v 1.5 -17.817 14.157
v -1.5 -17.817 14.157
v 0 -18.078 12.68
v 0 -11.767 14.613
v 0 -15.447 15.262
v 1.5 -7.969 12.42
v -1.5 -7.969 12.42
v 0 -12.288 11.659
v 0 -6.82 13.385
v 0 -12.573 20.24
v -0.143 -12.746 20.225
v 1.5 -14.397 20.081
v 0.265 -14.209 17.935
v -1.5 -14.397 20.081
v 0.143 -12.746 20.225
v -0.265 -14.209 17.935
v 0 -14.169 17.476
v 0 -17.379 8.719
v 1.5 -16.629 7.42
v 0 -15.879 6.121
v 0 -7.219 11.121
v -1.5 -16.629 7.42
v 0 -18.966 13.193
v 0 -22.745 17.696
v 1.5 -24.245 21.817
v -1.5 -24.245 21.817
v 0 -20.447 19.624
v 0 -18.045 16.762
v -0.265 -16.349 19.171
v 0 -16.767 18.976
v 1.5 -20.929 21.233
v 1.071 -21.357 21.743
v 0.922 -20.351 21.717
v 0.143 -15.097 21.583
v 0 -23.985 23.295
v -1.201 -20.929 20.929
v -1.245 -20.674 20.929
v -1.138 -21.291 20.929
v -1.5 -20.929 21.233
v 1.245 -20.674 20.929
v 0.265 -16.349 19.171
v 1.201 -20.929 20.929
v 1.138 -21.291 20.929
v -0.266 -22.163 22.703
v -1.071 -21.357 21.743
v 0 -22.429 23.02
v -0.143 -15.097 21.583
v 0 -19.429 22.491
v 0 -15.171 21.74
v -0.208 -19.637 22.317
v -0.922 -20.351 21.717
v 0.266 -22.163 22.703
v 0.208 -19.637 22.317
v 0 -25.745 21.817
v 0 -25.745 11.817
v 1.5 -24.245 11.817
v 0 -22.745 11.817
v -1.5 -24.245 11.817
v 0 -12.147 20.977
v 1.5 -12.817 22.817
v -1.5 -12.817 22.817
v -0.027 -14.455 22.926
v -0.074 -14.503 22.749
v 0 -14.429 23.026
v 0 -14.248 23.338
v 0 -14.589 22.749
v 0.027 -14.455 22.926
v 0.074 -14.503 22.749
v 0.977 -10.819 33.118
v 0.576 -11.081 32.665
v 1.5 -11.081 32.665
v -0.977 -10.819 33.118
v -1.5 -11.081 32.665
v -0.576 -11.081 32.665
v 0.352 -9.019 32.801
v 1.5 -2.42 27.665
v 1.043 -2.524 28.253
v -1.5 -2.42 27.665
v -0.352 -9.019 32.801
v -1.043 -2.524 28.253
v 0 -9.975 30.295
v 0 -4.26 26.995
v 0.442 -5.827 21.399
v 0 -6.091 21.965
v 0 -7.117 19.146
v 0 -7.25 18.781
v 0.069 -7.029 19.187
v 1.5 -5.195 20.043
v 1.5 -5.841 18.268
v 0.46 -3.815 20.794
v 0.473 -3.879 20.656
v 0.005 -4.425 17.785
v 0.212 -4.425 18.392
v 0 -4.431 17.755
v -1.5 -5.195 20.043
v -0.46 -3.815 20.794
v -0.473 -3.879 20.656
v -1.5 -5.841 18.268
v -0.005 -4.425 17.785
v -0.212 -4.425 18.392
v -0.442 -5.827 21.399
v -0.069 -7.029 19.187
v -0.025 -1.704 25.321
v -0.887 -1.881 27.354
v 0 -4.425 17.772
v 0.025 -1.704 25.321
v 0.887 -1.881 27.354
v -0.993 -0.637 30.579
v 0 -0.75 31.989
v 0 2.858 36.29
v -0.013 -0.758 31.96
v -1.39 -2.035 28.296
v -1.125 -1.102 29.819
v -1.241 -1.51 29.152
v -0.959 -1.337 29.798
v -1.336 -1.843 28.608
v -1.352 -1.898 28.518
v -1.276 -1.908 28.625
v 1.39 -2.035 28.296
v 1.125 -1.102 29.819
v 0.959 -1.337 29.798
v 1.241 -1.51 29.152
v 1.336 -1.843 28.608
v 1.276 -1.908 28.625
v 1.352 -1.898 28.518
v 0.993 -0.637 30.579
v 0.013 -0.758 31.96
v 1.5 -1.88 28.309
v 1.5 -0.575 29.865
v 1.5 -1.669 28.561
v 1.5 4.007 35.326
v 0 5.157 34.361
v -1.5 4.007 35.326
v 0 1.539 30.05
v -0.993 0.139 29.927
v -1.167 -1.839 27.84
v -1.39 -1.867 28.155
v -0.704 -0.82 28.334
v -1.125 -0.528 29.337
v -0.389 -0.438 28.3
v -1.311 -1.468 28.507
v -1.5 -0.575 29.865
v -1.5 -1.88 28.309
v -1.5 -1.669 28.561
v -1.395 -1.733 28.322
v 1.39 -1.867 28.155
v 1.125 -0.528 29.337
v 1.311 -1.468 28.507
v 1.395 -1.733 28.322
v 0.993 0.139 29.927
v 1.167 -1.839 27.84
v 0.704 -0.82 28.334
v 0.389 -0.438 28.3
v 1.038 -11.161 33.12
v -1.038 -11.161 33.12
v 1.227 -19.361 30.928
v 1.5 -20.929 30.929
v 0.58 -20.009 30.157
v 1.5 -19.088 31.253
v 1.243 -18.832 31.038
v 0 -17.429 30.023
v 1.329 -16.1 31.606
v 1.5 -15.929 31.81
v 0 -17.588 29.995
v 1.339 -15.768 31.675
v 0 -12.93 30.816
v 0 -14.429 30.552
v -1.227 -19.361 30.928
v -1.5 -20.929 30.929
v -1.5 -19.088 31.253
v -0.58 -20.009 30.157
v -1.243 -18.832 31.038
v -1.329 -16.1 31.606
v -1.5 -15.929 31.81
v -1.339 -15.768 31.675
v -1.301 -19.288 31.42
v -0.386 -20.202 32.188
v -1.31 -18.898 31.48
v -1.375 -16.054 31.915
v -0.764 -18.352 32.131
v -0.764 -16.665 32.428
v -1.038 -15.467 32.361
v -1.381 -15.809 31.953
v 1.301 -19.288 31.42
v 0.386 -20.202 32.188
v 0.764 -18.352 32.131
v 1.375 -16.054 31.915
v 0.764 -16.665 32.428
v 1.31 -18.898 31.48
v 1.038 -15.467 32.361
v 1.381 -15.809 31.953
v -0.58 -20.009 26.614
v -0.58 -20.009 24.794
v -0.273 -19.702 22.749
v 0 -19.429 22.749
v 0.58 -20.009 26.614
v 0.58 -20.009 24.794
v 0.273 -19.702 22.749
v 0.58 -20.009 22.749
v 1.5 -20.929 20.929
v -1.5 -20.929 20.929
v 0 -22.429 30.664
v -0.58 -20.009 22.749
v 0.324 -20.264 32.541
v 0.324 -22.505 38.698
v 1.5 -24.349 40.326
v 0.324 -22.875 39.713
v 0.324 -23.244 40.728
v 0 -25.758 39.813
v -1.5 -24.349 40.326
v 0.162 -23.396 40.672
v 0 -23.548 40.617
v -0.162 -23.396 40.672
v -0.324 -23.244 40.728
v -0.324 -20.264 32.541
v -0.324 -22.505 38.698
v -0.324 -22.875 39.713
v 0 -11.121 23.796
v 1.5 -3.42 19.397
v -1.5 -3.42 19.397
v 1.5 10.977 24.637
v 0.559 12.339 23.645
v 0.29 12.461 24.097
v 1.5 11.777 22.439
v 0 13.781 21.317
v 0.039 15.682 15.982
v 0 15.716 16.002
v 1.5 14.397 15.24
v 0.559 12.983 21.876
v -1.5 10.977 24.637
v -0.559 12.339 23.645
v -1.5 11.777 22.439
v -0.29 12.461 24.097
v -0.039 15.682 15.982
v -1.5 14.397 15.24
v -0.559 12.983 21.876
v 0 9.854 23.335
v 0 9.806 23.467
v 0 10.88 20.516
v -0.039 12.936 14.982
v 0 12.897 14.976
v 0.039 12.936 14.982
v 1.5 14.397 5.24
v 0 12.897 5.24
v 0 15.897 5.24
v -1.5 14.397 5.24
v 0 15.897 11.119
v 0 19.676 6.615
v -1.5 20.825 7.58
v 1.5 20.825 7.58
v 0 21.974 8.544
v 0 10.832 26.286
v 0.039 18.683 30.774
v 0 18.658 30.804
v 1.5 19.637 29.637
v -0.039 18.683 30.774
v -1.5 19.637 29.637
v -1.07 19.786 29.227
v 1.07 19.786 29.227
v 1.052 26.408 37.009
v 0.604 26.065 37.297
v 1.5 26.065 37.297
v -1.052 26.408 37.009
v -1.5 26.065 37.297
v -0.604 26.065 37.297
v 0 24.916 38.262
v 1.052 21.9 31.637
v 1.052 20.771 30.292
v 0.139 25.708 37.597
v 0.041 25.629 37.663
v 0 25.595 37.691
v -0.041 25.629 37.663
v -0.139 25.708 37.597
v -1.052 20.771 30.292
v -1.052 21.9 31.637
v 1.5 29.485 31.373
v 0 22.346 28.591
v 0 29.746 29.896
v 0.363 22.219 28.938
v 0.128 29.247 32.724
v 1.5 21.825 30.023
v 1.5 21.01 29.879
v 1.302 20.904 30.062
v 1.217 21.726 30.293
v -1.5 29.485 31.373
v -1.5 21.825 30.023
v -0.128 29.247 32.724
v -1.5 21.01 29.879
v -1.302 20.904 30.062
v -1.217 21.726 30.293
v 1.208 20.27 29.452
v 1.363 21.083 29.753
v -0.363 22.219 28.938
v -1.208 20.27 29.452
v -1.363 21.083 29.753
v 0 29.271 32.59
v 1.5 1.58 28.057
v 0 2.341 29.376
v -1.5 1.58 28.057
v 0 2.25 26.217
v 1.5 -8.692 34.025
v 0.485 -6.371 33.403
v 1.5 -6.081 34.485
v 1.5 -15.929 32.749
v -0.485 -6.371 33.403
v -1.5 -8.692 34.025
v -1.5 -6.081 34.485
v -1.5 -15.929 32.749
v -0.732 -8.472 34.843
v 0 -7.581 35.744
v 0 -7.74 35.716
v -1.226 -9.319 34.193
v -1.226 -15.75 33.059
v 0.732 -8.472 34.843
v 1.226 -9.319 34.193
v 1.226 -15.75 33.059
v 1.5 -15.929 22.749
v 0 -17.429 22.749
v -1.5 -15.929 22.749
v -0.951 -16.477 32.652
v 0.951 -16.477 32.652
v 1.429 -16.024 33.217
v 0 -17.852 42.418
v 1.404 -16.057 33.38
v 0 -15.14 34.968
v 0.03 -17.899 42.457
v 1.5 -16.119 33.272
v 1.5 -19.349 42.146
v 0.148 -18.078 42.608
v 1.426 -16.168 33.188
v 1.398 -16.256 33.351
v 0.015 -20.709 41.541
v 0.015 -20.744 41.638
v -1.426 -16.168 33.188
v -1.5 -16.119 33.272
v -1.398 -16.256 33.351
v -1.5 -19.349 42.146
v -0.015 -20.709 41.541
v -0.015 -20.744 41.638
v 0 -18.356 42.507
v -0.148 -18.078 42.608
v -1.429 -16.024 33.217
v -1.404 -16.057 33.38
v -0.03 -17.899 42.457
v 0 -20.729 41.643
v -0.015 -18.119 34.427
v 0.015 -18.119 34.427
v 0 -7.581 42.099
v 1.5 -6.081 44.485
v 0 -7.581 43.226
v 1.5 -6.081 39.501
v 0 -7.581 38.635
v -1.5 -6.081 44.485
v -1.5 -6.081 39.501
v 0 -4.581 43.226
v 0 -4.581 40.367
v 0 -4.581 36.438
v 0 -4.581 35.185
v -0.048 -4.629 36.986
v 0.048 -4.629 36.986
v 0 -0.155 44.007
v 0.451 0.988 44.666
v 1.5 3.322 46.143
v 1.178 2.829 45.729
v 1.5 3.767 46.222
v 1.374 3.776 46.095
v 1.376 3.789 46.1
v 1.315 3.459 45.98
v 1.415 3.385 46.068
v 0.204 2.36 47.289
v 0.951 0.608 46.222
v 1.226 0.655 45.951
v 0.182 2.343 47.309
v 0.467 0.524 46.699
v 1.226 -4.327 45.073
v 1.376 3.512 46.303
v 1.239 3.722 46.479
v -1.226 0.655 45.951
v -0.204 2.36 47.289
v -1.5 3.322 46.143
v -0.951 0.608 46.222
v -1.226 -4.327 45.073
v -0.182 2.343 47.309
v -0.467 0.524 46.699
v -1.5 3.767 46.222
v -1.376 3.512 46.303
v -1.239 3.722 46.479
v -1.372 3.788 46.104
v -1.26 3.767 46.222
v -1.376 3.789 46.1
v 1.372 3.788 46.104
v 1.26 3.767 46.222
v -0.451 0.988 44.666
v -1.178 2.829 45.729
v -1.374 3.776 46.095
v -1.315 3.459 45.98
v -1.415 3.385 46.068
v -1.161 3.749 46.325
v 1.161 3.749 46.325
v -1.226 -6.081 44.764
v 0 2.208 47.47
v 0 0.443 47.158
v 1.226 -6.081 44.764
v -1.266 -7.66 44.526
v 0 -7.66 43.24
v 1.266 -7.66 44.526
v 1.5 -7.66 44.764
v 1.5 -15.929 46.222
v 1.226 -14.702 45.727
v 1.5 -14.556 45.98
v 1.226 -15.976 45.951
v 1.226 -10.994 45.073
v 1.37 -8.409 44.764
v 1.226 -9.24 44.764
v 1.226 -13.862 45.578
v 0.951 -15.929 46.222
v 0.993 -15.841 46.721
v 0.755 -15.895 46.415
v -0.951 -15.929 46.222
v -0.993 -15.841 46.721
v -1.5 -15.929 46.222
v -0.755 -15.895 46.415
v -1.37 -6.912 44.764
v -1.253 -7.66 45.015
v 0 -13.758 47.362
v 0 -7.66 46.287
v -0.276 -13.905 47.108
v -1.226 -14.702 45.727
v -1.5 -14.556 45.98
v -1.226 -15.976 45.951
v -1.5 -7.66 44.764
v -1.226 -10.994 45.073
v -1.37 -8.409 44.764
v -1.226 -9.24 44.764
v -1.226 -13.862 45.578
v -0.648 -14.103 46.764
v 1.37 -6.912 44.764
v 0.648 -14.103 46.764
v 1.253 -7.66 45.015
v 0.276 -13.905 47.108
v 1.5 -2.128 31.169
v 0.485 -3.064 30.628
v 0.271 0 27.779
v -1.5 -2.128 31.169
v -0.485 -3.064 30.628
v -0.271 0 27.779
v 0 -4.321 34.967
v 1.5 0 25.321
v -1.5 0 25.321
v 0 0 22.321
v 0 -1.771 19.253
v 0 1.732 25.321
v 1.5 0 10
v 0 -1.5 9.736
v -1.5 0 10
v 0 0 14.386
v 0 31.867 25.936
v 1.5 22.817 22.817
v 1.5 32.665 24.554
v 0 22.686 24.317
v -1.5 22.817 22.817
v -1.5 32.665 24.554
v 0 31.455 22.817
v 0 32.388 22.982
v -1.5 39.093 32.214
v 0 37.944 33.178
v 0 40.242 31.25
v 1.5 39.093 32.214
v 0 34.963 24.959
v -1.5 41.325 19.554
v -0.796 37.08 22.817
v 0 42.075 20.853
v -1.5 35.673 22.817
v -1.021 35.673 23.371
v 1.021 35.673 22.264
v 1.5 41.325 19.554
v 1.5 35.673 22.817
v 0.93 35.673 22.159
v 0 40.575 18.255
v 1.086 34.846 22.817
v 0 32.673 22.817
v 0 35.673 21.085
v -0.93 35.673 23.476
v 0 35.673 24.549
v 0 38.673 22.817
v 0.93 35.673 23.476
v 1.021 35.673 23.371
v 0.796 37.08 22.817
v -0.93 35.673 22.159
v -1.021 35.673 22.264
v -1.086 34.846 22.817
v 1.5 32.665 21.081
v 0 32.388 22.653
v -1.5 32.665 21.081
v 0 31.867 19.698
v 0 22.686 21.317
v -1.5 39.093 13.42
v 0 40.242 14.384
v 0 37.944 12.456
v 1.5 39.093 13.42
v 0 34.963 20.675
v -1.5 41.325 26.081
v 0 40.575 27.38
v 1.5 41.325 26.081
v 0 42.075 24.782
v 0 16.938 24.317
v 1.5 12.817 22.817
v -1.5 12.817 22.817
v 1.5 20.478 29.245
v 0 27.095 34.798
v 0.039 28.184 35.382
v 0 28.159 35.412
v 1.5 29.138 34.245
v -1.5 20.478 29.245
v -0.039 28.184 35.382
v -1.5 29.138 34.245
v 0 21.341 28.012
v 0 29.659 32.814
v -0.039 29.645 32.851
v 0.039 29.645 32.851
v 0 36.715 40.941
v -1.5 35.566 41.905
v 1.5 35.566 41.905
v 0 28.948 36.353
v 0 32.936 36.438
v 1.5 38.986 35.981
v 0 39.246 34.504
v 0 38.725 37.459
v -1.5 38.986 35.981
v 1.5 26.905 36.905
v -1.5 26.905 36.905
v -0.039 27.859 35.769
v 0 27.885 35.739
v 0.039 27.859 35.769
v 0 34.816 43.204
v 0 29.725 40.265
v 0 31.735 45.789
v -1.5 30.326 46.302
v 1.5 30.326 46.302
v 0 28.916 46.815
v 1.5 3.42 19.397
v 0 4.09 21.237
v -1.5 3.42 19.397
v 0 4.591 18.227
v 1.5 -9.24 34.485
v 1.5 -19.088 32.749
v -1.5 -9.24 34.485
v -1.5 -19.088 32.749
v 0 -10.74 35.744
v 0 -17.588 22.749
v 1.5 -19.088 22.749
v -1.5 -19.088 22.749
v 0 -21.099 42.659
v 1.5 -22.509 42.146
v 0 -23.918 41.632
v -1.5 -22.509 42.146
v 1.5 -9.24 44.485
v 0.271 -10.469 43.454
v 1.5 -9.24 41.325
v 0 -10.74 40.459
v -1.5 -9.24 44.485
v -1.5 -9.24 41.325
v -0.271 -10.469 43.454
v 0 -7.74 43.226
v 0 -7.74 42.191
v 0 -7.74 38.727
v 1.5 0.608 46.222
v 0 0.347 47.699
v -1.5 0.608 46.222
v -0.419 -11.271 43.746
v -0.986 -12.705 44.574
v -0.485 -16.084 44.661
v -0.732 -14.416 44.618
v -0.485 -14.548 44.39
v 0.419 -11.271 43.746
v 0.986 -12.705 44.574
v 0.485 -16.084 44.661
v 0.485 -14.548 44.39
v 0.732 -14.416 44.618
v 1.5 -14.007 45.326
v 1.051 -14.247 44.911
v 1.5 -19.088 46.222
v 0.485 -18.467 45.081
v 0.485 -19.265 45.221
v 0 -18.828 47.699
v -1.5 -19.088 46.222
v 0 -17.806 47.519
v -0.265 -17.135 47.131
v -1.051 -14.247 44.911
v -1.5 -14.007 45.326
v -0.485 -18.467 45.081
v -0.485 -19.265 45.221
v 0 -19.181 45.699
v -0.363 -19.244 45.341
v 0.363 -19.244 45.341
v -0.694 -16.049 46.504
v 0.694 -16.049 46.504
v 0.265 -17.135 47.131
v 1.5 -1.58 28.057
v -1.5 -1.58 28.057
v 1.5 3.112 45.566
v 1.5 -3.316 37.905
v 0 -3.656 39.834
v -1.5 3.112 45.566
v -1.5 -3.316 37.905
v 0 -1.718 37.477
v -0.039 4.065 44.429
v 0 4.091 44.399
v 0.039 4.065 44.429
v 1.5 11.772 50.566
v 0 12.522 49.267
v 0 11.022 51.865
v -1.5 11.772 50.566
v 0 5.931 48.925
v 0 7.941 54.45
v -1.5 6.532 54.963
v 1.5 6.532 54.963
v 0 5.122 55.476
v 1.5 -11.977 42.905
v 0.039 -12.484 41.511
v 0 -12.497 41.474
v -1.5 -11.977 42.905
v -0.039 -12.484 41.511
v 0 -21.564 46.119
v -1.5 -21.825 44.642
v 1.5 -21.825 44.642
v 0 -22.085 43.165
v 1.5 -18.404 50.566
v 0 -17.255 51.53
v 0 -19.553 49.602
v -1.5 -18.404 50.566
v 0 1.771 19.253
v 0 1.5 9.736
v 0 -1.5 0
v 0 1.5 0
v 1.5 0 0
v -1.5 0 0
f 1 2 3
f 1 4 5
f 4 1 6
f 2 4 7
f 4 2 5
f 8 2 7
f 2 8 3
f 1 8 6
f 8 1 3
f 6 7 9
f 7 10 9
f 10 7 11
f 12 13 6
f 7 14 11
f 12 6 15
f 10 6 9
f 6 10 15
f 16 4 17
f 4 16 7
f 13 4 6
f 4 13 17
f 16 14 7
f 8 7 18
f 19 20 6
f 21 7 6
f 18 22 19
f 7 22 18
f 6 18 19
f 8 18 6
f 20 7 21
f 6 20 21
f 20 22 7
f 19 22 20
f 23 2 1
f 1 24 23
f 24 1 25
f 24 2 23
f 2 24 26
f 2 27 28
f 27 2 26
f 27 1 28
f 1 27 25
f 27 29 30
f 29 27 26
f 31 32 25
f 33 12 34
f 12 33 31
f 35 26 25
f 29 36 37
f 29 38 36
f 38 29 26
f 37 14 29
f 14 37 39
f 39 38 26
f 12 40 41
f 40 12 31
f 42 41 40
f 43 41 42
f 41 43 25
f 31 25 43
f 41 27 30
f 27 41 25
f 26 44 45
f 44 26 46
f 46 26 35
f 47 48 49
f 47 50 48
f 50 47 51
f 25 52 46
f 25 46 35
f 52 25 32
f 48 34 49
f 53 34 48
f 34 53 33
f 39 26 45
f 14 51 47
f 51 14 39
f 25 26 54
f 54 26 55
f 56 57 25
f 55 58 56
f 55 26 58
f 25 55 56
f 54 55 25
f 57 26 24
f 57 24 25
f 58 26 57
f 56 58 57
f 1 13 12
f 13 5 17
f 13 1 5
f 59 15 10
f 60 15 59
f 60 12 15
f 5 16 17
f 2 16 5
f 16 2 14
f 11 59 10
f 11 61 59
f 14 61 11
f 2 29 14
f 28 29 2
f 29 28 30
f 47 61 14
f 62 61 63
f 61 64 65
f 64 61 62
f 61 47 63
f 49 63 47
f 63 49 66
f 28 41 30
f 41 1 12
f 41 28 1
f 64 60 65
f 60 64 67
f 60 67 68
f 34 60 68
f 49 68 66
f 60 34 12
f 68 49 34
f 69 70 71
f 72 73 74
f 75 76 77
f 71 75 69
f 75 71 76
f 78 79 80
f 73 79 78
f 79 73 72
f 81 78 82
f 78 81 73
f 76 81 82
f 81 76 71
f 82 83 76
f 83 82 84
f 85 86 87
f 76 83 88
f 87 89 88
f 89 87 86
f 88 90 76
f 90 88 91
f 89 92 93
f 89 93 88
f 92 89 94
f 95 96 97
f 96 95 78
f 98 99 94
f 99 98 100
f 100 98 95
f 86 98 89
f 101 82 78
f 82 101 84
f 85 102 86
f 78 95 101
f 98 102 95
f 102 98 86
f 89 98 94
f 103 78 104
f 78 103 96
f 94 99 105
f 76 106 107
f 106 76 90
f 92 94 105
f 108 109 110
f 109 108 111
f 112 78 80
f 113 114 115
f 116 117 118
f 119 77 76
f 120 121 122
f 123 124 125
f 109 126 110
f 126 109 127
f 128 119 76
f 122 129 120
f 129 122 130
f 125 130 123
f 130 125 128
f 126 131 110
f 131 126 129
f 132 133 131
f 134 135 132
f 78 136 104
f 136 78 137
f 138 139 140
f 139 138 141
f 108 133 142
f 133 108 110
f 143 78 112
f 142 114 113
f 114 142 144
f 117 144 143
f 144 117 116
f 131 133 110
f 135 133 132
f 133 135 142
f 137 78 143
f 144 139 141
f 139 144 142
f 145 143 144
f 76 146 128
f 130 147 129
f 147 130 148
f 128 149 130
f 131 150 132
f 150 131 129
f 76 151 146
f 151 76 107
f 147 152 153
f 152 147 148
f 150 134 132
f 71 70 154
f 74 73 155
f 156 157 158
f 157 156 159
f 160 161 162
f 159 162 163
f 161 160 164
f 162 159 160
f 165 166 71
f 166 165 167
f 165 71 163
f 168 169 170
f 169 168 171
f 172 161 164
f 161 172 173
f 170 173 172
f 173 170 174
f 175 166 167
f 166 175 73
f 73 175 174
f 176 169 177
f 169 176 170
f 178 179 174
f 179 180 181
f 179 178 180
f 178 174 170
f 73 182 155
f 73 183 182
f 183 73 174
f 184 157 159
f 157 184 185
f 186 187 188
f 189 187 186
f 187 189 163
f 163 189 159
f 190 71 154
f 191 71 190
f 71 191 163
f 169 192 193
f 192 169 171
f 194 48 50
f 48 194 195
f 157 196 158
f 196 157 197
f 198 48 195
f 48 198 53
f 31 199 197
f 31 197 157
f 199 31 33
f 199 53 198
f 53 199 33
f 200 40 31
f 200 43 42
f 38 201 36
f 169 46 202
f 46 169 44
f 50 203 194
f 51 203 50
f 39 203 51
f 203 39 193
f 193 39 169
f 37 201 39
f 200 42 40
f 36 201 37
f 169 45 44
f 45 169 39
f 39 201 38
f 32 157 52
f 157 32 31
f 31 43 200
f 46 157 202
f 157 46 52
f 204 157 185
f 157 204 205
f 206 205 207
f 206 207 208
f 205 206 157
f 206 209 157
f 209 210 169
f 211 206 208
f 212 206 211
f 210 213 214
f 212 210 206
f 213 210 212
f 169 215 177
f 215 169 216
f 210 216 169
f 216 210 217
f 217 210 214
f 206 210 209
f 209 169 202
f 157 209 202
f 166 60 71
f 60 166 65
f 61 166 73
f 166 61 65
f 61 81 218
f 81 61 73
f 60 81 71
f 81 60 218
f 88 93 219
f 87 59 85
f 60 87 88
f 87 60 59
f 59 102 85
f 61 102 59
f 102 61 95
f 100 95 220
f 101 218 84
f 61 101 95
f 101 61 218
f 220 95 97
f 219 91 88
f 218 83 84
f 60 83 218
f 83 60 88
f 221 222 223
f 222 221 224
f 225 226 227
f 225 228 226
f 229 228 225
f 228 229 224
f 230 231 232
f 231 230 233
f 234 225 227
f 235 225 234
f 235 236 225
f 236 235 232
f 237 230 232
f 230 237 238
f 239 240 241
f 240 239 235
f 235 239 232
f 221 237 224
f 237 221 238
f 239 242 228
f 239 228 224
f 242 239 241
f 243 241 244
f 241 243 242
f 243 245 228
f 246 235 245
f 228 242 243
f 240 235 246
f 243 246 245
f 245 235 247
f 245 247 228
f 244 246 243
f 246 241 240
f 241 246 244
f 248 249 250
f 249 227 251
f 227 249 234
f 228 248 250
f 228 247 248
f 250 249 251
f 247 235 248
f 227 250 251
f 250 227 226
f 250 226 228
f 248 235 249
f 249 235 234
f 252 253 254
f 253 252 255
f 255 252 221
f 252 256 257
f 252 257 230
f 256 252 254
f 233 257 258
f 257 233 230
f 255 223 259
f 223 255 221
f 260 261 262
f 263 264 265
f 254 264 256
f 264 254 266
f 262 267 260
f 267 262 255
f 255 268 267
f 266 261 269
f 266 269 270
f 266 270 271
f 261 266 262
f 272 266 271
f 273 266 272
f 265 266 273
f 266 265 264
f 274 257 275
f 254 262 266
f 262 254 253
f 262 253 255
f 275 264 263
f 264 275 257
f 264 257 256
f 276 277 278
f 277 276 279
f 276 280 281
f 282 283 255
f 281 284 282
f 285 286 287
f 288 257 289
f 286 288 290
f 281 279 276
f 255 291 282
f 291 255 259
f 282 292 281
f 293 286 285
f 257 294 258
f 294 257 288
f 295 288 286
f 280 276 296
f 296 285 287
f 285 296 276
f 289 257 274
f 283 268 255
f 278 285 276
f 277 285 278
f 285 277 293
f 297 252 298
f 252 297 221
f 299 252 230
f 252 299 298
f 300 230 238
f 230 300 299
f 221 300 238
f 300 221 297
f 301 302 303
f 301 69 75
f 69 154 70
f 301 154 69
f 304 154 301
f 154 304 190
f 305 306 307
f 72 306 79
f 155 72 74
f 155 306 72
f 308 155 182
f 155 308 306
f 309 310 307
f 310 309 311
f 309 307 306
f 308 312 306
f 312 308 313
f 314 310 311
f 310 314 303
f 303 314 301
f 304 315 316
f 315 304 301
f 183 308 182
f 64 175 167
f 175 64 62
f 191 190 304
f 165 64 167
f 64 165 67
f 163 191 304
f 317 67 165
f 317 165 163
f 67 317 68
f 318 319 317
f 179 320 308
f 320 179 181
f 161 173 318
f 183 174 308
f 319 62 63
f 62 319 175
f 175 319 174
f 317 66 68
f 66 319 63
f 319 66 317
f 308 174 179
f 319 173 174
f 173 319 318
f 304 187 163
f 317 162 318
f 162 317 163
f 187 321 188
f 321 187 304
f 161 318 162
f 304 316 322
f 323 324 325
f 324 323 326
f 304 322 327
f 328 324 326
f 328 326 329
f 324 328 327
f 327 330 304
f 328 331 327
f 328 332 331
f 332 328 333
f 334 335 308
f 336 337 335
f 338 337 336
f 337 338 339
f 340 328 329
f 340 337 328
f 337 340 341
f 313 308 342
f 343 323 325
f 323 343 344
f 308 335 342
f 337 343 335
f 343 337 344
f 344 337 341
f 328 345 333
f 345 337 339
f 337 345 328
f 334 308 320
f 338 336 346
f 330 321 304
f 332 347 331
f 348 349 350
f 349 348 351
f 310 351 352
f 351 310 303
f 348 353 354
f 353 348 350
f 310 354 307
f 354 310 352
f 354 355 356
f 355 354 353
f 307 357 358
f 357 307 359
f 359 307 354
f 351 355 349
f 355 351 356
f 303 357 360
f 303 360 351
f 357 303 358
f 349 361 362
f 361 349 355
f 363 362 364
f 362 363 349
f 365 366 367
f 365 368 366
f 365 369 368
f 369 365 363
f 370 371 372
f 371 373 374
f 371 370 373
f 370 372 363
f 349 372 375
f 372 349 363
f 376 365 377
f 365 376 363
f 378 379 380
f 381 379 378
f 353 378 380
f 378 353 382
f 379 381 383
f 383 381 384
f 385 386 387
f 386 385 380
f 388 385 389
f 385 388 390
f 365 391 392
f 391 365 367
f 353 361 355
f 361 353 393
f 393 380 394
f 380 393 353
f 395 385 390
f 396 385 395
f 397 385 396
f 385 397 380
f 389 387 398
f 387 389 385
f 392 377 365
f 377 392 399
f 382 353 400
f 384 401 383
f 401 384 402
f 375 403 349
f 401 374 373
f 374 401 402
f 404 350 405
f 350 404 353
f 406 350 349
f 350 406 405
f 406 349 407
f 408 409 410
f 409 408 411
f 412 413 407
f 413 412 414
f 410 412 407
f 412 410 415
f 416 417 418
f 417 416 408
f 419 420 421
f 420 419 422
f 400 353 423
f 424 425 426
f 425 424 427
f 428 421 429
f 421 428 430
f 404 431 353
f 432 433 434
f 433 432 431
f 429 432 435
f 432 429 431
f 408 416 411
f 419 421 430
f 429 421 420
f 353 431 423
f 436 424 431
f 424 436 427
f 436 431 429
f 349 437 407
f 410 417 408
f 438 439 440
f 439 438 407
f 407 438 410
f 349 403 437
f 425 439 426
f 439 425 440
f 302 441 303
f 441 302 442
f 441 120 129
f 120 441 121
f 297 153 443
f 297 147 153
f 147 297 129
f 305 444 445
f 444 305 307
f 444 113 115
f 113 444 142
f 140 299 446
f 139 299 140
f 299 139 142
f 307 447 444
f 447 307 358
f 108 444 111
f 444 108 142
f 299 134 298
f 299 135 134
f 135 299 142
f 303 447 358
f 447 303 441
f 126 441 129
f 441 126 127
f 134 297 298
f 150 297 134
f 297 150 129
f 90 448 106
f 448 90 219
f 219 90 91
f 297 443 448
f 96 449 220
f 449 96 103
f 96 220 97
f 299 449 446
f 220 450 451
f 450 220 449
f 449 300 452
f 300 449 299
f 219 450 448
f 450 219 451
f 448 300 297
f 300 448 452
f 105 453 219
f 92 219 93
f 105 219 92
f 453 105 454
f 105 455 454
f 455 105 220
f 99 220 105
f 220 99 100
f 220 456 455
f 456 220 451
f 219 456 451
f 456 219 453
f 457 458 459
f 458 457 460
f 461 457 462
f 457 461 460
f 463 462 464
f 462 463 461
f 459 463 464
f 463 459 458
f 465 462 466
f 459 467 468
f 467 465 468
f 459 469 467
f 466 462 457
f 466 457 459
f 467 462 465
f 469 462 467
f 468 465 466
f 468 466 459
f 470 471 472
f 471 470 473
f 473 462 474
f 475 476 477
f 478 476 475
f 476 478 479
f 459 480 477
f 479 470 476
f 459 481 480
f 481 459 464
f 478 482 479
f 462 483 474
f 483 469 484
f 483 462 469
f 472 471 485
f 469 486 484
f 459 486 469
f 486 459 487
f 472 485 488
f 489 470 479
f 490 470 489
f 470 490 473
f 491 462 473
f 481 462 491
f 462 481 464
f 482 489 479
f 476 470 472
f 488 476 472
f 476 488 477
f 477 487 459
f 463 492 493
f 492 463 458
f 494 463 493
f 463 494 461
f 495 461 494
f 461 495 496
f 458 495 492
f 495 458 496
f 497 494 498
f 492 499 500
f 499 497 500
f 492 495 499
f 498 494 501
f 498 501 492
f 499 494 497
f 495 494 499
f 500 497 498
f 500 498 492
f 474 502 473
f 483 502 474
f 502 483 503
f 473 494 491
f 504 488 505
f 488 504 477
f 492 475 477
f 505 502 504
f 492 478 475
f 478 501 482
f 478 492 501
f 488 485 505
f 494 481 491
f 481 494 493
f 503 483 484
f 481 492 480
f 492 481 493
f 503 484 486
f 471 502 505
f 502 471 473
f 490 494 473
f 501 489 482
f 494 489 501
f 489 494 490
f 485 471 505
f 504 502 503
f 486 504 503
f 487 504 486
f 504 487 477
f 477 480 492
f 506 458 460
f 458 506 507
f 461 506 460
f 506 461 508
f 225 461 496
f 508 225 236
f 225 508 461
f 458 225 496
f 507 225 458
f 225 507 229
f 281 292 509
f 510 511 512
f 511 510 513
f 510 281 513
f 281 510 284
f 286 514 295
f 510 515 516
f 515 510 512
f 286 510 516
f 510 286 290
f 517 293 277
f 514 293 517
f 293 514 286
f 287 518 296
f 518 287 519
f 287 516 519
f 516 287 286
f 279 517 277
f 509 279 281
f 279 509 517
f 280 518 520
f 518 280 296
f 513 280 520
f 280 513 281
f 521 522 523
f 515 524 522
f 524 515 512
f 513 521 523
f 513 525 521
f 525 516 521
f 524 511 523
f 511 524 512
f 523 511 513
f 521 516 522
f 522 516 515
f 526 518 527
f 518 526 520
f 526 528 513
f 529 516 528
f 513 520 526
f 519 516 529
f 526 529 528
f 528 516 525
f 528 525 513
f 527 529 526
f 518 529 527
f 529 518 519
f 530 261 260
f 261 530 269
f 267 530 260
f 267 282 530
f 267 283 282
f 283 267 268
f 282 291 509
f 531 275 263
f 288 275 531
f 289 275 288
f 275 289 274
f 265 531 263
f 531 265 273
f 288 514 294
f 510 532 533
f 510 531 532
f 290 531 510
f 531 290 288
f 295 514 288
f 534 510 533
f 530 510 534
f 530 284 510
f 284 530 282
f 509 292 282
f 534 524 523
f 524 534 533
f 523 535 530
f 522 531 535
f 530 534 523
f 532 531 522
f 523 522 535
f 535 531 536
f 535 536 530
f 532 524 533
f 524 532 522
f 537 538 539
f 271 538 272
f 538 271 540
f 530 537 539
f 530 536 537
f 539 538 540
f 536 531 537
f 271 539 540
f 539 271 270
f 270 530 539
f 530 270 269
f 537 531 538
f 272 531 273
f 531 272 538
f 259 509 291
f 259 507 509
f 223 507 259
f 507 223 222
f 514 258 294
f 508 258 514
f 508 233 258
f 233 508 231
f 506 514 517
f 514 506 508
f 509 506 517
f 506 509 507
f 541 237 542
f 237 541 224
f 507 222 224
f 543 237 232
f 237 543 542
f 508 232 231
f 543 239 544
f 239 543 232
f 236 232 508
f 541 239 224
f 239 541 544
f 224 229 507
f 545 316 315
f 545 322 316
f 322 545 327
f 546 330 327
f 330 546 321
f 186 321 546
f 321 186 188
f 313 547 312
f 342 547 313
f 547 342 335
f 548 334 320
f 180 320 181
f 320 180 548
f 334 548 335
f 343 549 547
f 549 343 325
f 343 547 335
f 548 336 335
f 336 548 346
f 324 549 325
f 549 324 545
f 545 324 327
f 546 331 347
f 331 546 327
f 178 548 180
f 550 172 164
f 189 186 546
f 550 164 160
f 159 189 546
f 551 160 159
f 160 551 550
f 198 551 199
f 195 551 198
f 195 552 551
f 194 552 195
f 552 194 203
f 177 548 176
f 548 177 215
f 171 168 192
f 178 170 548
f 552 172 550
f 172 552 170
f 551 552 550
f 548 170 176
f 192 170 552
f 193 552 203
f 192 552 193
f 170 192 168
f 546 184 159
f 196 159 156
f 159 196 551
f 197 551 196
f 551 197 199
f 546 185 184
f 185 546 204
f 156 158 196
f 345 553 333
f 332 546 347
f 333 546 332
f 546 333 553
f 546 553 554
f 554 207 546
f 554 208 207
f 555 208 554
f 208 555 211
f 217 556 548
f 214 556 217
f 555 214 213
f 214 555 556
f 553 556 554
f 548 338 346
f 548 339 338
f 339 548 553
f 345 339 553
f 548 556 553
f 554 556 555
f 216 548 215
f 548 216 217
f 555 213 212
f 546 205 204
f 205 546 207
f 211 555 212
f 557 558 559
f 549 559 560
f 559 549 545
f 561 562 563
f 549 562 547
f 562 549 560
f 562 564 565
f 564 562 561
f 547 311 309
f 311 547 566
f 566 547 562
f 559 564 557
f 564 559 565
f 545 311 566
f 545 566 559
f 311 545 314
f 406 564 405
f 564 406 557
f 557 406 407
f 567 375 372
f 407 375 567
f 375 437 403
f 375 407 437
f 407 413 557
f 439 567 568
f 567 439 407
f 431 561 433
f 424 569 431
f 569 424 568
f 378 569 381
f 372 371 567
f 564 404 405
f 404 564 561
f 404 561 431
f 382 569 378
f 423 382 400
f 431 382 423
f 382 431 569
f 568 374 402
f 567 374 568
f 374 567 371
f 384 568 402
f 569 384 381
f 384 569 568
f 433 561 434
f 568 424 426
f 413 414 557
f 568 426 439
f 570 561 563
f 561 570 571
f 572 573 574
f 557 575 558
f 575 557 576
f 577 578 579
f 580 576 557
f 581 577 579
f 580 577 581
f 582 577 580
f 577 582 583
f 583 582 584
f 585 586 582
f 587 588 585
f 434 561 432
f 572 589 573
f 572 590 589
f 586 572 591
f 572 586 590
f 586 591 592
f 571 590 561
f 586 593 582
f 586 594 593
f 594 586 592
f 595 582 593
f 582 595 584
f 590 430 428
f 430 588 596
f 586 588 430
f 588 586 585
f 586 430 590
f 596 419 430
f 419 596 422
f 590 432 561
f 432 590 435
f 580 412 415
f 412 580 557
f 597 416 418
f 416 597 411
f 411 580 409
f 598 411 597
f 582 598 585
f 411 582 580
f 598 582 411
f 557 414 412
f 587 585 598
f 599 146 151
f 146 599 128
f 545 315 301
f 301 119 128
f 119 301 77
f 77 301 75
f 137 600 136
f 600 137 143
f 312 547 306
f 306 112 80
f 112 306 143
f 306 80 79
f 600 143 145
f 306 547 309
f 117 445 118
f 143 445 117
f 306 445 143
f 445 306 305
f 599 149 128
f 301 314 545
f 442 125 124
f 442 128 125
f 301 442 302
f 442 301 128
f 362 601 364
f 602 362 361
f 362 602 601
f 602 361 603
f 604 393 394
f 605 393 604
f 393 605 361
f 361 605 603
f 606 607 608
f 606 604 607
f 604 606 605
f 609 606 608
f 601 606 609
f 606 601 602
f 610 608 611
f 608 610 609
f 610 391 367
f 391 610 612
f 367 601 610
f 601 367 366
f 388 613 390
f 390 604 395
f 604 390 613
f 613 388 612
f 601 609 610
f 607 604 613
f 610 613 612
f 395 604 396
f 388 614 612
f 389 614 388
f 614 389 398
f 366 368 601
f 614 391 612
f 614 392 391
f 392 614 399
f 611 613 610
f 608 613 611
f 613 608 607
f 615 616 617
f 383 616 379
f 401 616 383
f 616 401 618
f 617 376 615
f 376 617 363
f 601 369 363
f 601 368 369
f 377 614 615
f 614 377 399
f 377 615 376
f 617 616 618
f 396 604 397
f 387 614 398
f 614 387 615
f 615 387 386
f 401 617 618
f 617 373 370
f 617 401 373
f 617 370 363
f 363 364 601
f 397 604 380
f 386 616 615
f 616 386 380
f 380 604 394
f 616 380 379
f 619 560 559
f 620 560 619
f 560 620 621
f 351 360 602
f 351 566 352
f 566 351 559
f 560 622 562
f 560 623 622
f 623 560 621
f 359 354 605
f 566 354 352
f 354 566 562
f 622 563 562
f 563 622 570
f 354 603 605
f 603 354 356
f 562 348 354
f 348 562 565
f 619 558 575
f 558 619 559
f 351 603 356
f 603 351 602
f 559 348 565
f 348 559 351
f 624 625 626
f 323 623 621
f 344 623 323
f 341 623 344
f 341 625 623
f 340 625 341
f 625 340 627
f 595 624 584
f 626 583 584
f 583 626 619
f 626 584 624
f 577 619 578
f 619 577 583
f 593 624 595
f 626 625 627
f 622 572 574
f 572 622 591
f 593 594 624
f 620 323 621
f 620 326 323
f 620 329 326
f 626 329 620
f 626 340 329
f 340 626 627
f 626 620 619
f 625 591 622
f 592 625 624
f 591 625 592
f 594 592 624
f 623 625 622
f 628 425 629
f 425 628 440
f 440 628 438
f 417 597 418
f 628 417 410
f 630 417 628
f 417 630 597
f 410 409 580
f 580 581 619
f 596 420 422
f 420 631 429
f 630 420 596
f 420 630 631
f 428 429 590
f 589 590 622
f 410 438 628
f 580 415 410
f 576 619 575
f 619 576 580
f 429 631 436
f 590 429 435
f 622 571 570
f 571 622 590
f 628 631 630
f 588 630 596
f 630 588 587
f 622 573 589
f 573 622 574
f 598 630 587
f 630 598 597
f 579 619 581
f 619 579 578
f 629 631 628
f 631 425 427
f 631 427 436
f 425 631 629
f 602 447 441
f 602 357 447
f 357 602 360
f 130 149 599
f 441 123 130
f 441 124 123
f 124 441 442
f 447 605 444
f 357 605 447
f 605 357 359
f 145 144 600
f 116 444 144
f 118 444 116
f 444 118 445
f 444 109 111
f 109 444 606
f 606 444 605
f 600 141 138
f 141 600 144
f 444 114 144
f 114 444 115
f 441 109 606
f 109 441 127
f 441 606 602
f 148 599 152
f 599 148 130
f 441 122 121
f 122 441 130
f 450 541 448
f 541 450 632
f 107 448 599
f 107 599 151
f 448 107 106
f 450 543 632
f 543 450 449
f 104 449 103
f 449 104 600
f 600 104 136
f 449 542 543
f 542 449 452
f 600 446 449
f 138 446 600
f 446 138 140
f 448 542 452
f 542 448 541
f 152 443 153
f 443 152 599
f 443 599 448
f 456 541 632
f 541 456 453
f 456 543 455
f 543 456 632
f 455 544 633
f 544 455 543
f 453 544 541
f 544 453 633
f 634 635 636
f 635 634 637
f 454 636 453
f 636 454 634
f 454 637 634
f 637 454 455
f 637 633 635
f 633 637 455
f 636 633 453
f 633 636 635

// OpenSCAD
module tree(
increment,
depth,
angle
){

linear_extrude(height=increment)
children(0);

if (depth>0){
     translate([0,0,increment])
     rotate([angle,0,0])
     tree(increment,
           depth-1,
           angle+30)
     circle(d=3,$fn=4);
      }

if(depth>0){
     translate([0,0,increment])
     rotate([-angle,0,0])
     tree(increment,
          depth-1,
          -(angle+30))
     circle(d=3,$fn=4);
 
}
}

tree(
increment=10,
depth=5,
angle=20
)circle(d=3,$fn=4);
